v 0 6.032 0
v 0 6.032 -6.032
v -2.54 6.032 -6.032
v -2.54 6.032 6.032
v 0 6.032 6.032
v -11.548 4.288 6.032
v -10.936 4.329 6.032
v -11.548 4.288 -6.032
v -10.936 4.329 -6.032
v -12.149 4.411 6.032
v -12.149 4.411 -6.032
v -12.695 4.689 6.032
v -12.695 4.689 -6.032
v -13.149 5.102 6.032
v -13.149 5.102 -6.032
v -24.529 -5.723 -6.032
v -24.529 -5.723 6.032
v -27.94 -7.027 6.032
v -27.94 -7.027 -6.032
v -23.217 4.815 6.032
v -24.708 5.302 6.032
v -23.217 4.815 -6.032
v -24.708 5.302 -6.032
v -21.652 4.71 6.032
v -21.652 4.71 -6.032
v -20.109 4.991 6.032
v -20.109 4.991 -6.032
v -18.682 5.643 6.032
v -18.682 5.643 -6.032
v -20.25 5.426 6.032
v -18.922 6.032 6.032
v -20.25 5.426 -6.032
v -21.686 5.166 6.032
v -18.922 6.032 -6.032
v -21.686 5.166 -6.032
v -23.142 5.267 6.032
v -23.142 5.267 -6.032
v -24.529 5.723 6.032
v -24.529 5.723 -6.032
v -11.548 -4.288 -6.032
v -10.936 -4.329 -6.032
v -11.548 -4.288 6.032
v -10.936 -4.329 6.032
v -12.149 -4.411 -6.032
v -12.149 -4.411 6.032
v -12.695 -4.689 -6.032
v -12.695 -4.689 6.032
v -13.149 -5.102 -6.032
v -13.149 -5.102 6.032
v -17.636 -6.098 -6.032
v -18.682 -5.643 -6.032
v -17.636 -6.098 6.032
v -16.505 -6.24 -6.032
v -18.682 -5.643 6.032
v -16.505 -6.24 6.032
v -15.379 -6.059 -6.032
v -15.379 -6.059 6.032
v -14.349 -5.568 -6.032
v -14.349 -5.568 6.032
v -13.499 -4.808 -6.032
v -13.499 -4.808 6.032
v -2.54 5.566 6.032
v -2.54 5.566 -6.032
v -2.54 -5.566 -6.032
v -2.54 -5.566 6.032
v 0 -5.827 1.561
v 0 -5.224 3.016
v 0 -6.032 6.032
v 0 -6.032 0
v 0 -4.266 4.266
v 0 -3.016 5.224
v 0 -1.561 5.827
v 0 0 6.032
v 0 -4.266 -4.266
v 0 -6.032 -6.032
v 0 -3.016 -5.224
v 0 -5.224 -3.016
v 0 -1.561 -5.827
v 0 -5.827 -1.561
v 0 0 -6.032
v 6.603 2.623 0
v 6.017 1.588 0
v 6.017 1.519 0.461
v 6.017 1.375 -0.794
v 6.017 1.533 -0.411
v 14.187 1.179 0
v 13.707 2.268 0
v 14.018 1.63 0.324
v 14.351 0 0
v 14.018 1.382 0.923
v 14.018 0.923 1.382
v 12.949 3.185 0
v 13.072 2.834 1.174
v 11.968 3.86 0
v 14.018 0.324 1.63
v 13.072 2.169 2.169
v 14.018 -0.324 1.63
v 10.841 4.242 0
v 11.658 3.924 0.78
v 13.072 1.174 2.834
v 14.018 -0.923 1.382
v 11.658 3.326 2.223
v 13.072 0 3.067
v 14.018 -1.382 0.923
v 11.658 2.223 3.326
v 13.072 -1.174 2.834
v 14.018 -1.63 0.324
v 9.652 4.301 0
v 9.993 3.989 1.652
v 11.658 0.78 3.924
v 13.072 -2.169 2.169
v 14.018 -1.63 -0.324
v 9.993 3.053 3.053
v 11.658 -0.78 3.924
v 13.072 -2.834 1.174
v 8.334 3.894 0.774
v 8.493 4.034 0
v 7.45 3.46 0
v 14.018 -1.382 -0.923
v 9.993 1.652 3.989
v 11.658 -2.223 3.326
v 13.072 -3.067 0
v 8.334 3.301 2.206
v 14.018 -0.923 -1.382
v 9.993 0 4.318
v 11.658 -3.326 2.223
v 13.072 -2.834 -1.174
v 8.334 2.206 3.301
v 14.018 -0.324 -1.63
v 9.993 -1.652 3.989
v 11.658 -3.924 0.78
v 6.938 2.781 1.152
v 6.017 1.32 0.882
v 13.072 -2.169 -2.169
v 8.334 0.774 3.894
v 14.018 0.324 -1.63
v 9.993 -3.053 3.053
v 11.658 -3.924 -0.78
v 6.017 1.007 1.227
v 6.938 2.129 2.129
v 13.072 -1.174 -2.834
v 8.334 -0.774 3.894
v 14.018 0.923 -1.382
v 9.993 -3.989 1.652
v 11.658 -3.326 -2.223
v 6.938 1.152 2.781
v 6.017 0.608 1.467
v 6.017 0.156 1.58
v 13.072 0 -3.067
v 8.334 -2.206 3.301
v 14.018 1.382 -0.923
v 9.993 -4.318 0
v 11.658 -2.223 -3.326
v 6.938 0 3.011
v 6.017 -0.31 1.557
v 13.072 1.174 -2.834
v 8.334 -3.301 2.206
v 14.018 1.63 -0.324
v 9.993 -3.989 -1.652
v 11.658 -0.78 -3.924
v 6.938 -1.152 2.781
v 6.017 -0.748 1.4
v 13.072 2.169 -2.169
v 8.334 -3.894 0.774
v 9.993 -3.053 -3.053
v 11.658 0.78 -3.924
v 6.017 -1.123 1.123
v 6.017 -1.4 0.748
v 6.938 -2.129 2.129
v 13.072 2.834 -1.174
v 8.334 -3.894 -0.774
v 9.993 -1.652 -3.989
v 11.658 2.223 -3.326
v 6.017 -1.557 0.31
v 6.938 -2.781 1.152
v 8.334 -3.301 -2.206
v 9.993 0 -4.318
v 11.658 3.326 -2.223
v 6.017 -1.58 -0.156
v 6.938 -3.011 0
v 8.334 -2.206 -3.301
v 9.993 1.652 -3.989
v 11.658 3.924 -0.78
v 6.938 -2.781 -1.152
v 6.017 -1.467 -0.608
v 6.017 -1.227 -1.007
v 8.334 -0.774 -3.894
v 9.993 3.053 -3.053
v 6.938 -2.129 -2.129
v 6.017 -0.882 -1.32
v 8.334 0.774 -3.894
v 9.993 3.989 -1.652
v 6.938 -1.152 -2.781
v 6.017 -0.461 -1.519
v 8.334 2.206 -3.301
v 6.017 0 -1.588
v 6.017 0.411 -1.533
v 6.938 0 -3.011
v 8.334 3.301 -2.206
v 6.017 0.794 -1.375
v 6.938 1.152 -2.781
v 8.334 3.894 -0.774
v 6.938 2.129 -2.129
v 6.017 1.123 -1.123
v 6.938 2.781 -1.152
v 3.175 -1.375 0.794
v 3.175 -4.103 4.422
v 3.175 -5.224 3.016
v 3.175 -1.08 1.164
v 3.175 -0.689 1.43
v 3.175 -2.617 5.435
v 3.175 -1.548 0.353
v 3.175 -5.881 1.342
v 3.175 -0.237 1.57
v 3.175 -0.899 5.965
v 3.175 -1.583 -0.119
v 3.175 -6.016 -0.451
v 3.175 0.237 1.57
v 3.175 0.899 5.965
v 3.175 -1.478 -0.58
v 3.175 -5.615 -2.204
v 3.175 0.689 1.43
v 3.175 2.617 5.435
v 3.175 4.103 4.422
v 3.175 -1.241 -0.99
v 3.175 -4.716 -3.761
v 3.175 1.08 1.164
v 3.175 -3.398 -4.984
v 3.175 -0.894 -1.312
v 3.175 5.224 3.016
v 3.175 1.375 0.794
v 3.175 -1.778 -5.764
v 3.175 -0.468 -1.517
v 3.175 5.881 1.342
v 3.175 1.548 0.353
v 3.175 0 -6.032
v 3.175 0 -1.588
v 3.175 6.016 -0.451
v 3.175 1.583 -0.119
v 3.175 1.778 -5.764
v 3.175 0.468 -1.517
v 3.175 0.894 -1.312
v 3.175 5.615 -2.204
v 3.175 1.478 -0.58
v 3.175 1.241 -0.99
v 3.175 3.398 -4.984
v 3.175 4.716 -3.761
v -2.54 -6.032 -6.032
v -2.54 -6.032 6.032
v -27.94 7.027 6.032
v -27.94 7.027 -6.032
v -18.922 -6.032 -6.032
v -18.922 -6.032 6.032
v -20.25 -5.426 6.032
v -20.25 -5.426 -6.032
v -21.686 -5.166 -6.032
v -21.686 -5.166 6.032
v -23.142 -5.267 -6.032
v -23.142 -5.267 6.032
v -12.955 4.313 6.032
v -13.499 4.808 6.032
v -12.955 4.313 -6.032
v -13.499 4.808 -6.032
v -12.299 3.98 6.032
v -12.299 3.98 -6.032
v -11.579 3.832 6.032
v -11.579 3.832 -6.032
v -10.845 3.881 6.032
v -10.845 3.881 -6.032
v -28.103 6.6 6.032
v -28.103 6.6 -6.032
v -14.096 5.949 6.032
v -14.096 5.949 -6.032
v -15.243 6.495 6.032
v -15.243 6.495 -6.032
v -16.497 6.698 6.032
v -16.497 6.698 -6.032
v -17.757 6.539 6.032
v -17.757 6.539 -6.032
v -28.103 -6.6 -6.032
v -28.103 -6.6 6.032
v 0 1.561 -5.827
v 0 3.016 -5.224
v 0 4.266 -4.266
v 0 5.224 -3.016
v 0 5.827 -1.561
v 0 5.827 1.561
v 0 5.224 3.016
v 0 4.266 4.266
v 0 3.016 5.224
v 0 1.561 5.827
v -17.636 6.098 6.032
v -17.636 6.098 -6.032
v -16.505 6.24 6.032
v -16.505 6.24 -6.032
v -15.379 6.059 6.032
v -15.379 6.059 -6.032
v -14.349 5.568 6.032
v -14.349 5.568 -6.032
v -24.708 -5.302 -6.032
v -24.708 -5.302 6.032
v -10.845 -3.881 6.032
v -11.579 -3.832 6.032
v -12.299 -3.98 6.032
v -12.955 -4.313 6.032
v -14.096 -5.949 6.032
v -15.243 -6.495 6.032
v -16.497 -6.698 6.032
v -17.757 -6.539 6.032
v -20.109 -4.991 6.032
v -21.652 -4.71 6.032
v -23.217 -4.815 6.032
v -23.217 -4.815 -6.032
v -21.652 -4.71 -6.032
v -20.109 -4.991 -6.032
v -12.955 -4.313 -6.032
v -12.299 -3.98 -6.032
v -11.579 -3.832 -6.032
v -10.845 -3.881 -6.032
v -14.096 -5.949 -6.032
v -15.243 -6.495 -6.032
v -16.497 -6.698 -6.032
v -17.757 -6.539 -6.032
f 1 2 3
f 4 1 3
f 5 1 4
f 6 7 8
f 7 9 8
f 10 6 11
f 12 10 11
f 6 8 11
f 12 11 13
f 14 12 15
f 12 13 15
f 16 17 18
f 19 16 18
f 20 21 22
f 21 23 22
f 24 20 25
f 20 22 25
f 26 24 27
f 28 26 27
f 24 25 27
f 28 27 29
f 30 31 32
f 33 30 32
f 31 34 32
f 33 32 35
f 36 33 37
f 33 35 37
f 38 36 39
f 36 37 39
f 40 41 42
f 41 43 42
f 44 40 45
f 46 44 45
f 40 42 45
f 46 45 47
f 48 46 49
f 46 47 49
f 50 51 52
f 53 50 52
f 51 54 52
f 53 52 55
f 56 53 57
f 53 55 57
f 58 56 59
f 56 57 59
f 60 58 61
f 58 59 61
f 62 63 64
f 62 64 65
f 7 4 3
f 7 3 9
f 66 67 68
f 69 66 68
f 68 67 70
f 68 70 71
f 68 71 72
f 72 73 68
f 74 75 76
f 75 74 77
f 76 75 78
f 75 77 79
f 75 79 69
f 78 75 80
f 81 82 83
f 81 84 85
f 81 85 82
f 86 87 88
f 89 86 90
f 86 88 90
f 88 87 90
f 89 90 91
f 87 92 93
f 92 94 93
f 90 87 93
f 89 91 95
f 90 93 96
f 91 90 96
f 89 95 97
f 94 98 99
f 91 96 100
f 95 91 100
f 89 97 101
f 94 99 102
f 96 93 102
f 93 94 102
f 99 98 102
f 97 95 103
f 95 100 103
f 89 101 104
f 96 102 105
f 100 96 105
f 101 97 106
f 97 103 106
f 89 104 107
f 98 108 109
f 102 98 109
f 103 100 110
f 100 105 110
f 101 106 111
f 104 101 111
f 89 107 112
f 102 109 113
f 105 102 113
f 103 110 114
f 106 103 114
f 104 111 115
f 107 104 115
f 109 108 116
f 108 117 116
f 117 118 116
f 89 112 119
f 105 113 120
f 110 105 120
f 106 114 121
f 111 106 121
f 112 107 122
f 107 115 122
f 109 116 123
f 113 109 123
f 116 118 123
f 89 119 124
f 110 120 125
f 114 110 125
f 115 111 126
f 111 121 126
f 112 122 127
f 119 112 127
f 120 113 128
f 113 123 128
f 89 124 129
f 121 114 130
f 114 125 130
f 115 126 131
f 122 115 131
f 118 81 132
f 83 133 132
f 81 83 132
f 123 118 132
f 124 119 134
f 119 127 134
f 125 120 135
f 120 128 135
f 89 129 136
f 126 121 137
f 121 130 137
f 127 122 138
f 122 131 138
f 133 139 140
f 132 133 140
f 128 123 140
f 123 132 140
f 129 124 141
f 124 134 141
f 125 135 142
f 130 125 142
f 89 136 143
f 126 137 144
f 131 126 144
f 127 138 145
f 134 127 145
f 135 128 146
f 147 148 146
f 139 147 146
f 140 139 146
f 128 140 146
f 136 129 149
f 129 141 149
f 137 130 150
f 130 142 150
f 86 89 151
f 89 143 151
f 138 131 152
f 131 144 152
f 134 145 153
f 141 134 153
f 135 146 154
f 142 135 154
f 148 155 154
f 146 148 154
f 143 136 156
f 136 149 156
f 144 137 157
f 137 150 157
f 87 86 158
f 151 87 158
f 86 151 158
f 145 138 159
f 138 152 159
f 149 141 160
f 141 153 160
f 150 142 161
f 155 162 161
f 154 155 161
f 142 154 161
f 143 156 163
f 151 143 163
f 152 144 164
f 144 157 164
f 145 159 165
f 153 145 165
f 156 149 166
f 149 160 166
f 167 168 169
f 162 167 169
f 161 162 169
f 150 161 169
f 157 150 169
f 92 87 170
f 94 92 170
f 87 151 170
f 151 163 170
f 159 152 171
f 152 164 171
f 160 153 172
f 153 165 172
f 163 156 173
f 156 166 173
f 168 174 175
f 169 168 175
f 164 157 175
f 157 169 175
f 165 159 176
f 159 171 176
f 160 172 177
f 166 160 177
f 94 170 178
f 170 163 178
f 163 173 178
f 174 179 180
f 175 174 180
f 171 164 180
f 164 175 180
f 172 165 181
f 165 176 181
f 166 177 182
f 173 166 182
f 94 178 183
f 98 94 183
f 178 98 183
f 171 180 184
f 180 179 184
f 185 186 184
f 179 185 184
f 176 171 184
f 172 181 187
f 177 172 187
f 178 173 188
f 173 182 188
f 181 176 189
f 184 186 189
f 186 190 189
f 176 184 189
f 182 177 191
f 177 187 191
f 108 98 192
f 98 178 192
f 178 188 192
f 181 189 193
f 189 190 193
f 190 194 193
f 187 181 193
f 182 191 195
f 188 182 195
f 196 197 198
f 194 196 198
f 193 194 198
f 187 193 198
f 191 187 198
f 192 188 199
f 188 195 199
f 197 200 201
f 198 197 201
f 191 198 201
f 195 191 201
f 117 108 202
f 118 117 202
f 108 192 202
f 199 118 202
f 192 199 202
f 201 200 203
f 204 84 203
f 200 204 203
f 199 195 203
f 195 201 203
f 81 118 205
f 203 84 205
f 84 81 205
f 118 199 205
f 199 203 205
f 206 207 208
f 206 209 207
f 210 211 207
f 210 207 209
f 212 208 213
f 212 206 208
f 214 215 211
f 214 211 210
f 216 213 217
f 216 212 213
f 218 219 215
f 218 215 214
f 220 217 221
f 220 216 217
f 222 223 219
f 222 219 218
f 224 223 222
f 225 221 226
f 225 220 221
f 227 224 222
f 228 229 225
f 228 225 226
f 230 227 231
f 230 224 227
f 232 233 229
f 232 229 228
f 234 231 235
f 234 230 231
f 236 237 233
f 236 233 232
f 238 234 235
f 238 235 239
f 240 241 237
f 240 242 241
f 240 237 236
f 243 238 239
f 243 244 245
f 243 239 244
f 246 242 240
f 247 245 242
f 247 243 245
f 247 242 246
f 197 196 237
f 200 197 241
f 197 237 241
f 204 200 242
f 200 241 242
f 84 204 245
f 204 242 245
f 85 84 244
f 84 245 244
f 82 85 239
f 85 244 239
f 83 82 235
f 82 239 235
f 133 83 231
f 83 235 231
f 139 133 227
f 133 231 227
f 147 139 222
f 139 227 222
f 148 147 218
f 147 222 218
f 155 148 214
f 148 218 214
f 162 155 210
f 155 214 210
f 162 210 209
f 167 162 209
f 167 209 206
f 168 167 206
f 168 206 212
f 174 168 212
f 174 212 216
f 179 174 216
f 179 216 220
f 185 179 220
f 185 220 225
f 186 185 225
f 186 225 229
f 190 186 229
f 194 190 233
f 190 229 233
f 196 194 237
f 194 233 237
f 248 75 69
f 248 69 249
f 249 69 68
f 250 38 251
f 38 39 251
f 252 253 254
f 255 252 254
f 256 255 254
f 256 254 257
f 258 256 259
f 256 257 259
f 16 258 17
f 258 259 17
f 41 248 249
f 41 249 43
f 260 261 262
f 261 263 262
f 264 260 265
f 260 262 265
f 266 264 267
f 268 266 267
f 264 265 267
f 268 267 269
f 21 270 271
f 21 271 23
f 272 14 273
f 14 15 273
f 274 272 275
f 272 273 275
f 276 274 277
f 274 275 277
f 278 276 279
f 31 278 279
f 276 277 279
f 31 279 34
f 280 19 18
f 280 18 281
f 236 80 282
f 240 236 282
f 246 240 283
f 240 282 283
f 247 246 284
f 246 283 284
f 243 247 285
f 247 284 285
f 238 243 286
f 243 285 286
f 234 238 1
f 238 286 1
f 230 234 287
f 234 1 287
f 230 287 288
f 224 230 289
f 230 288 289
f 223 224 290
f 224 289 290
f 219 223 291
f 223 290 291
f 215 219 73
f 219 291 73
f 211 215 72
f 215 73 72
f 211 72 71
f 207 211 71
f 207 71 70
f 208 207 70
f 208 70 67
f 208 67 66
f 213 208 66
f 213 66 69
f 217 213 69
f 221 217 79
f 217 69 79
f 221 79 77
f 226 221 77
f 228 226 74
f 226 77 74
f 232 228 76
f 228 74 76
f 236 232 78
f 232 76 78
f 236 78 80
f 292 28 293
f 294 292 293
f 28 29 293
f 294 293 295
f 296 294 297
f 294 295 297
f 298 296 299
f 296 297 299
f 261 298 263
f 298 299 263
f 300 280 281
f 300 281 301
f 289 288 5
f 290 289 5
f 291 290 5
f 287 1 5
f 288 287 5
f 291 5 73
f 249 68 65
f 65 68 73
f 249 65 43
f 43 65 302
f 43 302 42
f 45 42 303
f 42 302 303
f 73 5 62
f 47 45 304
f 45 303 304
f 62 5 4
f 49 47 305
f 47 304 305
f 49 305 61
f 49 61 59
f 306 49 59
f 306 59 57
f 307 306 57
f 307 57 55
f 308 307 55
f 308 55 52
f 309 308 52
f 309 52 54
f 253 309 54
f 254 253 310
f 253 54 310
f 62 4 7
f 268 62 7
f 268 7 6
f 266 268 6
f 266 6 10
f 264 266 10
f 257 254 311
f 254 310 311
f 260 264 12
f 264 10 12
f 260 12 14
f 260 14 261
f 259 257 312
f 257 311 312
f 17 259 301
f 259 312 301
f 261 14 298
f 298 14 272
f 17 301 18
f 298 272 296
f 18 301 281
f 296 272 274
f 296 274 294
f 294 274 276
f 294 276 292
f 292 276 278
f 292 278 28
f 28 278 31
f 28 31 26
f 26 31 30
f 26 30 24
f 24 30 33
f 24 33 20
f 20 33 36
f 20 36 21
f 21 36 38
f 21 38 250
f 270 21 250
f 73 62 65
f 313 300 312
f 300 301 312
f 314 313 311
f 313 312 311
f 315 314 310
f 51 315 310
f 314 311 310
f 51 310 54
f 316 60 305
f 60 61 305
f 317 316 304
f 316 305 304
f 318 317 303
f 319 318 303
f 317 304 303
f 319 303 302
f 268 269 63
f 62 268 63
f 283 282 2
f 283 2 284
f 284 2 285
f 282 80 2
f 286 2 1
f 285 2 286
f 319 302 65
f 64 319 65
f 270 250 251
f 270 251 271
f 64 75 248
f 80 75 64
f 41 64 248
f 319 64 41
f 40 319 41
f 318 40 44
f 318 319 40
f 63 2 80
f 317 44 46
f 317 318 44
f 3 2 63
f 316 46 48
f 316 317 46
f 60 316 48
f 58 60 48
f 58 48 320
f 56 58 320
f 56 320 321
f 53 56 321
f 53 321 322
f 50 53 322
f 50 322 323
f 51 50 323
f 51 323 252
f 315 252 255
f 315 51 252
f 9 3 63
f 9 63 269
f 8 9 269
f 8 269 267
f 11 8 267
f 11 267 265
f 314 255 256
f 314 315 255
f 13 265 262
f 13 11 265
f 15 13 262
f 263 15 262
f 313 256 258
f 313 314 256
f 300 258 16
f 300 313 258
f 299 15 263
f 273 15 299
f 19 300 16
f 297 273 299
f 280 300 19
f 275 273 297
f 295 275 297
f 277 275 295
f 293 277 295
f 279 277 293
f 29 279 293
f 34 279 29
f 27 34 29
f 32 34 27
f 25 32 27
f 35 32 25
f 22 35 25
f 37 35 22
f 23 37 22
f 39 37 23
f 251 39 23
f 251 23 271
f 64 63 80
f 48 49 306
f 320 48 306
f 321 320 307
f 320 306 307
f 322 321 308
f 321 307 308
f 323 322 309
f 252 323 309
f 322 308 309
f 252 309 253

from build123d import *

# Parameters (mm, degrees)
SKETCH2_R           = 6.0325
BOSS_EXTRUDE1_DEPTH = 3.175
SKETCH3_R           = 1.5875
BOSS_EXTRUDE2_DEPTH = 3.175
SKETCH5_W           = 12.065
SKETCH5_H           = 12.065
BOSS_EXTRUDE3_DEPTH = 2.54
BOSS_EXTRUDE4_DEPTH = 6.0325


with BuildPart() as part:
    # Sketch2 → Boss-Extrude1 (new body)
    with BuildSketch(Plane(origin=(0, 0, 0), x_dir=(0, 0, -1), z_dir=(1, 0, 0))):
        Circle(SKETCH2_R)
    extrude(amount=BOSS_EXTRUDE1_DEPTH)

    # Sketch3 → Boss-Extrude2 (add)
    with BuildSketch(Plane(origin=(3.175, 0, 0), x_dir=(0, 0, -1), z_dir=(1, 0, 0))):
        Circle(SKETCH3_R)
    extrude(amount=BOSS_EXTRUDE2_DEPTH)

    # Sketch4 → Revolve1 (revolve)
    with BuildSketch(Plane.XY):
        with BuildLine():
            Line((5.715, 0), (14.351, 0))
            ThreePointArc((14.351, 0), (10.033, 4.318), (5.715, 0))
        make_face()
    revolve(axis=Axis((5.715, 0, 0), (1, 0, 0)))

    # Sketch5 → Boss-Extrude3 (add)
    with BuildSketch(Plane.ZY):
        Rectangle(SKETCH5_W, SKETCH5_H)
    extrude(amount=BOSS_EXTRUDE3_DEPTH)

    # Sketch7 → Boss-Extrude4 (add, symmetric)
    with BuildSketch(Plane.XY):
        with BuildLine():
            Line((-2.54, 6.0325), (-10.935574209, 4.328993713))
            ThreePointArc((-10.935574209, 4.328993713), (-12.148502267, 4.411480747), (-13.149077484, 5.102022434))
            ThreePointArc((-13.149077484, 5.102022434), (-15.862491492, 6.641192846), (-18.922091819, 6.0325))
            ThreePointArc((-18.922091819, 6.0325), (-21.686103075, 5.165714471), (-24.528789325, 5.7226797))
            Line((-24.528789325, 5.7226797), (-27.94, 7.027138907))
            Line((-27.94, 7.027138907), (-28.10330212, 6.600097624))
            Line((-28.10330212, 6.600097624), (-24.708214464, 5.301803917))
            ThreePointArc((-24.708214464, 5.301803917), (-21.651931317, 4.709711596), (-18.682120225, 5.64334004))
            ThreePointArc((-18.682120225, 5.64334004), (-15.935242742, 6.189818173), (-13.499167749, 4.807966919))
            ThreePointArc((-13.499167749, 4.807966919), (-12.299243569, 3.979845601), (-10.844658565, 3.880924315))
            Line((-10.844658565, 3.880924315), (-2.449084356, 5.584430602))
            Line((-2.449084356, 5.584430602), (-2.54, 6.0325))
        make_face()
        with BuildLine():
            Line((-24.528789325, -5.7226797), (-27.94, -7.027138907))
            Line((-27.94, -7.027138907), (-28.10330212, -6.600097624))
            Line((-28.10330212, -6.600097624), (-24.708214464, -5.301803917))
            ThreePointArc((-24.708214464, -5.301803917), (-21.651931317, -4.709711596), (-18.682120225, -5.64334004))
            ThreePointArc((-18.682120225, -5.64334004), (-15.935242742, -6.189818173), (-13.499167749, -4.807966919))
            ThreePointArc((-13.499167749, -4.807966919), (-12.299243569, -3.979845601), (-10.844658565, -3.880924315))
            Line((-10.844658565, -3.880924315), (-2.449084356, -5.584430602))
            Line((-2.449084356, -5.584430602), (-2.54, -6.0325))
            Line((-2.54, -6.0325), (-10.935574209, -4.328993713))
            ThreePointArc((-10.935574209, -4.328993713), (-12.148502267, -4.411480747), (-13.149077484, -5.102022434))
            ThreePointArc((-13.149077484, -5.102022434), (-15.862491492, -6.641192846), (-18.922091819, -6.0325))
            ThreePointArc((-18.922091819, -6.0325), (-21.686103075, -5.165714471), (-24.528789325, -5.7226797))
        make_face()
    extrude(amount=BOSS_EXTRUDE4_DEPTH, both=True)


solid = part.part
